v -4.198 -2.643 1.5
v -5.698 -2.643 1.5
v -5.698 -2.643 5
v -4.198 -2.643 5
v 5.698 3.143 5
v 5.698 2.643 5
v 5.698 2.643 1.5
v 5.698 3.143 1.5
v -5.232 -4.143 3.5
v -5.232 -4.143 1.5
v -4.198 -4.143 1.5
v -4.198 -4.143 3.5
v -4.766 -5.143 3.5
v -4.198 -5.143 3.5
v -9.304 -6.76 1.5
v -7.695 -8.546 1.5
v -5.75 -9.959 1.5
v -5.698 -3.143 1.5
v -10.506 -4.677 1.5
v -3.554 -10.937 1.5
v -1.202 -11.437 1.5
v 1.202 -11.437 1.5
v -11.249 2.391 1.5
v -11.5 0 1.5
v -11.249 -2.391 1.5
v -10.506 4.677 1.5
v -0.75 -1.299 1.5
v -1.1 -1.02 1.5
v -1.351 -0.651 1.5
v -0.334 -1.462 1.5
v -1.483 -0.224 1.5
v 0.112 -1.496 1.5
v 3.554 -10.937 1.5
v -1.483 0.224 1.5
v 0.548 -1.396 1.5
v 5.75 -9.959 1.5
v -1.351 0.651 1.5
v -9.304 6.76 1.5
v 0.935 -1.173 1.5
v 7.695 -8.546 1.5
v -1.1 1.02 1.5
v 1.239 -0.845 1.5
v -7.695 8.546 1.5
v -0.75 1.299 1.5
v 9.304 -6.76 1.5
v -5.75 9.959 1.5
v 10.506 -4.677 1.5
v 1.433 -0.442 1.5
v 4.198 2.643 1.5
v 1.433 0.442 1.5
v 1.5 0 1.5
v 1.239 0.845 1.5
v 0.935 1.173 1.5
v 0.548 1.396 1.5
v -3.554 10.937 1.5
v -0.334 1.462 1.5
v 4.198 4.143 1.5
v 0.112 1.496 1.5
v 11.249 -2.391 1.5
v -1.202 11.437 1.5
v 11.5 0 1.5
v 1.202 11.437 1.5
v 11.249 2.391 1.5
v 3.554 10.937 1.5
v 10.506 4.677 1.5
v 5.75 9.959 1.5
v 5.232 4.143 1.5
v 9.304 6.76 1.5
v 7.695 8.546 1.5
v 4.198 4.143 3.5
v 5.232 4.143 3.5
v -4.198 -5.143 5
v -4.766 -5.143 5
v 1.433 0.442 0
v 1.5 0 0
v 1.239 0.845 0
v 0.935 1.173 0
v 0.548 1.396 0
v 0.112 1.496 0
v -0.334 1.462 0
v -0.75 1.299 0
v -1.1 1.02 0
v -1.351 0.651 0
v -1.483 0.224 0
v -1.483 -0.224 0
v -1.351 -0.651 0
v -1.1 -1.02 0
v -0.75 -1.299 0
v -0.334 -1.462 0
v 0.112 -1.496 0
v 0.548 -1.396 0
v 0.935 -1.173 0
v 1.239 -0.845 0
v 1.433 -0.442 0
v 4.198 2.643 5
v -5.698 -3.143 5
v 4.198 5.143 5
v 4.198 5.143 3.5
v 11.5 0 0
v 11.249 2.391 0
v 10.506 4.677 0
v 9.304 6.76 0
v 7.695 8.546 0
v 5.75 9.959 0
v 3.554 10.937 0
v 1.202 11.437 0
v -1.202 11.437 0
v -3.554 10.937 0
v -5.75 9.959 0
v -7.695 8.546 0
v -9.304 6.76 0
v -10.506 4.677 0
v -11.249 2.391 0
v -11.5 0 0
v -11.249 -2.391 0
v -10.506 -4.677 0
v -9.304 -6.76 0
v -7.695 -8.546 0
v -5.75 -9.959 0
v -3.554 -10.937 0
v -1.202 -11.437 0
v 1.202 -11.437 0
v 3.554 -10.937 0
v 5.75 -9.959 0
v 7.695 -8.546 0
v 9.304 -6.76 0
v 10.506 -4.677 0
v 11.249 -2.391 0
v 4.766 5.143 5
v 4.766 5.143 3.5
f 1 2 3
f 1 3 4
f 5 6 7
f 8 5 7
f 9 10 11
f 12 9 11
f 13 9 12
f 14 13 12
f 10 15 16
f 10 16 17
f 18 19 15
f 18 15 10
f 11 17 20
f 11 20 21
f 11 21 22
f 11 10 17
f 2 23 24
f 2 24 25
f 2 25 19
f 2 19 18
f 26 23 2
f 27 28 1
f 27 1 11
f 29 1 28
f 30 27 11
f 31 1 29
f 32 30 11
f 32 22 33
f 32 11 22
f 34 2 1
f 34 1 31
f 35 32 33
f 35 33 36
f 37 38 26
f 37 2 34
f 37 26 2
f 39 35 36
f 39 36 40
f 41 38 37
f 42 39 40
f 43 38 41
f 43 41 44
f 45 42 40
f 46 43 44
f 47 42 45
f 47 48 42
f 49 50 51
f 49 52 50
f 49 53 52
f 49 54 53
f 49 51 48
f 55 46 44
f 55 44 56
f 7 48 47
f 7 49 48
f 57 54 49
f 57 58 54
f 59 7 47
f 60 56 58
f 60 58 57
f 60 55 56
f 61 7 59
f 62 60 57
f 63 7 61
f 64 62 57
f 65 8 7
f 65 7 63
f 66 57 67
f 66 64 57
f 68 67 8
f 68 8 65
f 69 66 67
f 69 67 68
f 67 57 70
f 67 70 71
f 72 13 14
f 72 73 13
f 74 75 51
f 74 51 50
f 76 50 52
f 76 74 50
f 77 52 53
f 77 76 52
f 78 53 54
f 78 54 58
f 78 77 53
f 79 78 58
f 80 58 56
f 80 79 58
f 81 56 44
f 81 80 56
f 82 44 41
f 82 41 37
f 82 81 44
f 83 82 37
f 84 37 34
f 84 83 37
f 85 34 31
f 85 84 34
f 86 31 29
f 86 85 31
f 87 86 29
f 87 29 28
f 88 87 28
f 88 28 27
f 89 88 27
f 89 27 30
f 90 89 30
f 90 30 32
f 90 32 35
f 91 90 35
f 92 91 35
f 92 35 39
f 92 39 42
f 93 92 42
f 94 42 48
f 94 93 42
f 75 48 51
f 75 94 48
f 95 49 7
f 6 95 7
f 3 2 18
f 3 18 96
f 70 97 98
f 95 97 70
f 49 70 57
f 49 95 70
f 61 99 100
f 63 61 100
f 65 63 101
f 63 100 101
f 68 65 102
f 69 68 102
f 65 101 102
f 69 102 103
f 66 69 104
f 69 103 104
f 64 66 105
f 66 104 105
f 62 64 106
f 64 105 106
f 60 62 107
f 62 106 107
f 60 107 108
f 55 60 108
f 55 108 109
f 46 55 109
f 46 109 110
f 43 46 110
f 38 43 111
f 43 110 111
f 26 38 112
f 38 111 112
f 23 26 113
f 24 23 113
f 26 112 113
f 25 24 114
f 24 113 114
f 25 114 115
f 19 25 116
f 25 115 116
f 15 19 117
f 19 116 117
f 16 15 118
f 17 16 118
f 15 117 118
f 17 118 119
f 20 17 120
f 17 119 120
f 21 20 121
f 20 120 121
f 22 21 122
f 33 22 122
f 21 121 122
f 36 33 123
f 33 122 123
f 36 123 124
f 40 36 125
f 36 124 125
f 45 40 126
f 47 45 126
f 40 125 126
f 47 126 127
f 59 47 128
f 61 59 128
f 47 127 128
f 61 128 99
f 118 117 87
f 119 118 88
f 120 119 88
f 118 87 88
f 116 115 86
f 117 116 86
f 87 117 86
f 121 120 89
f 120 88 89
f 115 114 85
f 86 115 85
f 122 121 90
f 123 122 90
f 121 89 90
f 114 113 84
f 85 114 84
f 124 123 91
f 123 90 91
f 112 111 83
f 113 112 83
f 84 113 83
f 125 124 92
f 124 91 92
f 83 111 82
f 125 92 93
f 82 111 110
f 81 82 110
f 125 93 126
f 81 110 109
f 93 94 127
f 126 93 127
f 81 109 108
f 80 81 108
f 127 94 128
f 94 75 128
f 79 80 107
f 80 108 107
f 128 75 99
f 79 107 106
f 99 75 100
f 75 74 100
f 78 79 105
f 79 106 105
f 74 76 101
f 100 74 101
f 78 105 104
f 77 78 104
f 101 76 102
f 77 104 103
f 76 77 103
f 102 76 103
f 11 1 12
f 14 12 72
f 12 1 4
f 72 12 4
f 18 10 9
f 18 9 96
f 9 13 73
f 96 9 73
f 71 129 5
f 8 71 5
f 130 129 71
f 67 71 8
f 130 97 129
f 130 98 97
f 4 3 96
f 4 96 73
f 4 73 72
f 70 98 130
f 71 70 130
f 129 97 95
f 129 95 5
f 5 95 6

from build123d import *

# Parameters (mm, degrees)
SKETCH1_R           = 11.5
SKETCH1_R_2         = 1.5
BOSS_EXTRUDE1_DEPTH = 1.5
SKETCH2_W           = 1.5
SKETCH2_H           = 1.5
BOSS_EXTRUDE3_DEPTH = 3.5
SKETCH3_W           = 1.5
SKETCH3_H           = 1.5
BOSS_EXTRUDE4_DEPTH = 1
CHAMFER2_SIZE       = 2
CHAMFER2_SIZE2      = 0.932615316
SKETCH5_W           = 1.5
SKETCH5_H           = 1.5
BOSS_EXTRUDE6_DEPTH = 1
CHAMFER5_SIZE       = 2
CHAMFER5_SIZE2      = 0.932615316


with BuildPart() as part:
    # Sketch1 → Boss-Extrude1 (new body)
    with BuildSketch(Plane.XY):
        Circle(SKETCH1_R)
        Circle(SKETCH1_R_2, mode=Mode.SUBTRACT)
    extrude(amount=BOSS_EXTRUDE1_DEPTH)

    # Sketch2 → Boss-Extrude3 (add)
    with BuildSketch(Plane.XY.offset(1.5)):
        with Locations((4.948341792, 3.393215807)):
            Rectangle(SKETCH2_W, SKETCH2_H)
        with Locations((-4.948341792, -3.393215807)):
            Rectangle(SKETCH2_W, SKETCH2_H)
    extrude(amount=BOSS_EXTRUDE3_DEPTH)

    # Sketch3 → Boss-Extrude4 (add)
    with BuildSketch(Plane(origin=(0, 4.143215807, 0), x_dir=(1, 0, 0), z_dir=(0, 1, 0))):
        with Locations((4.948341792, -4.25)):
            Rectangle(SKETCH3_W, SKETCH3_H)
    extrude(amount=BOSS_EXTRUDE4_DEPTH)

    # Chamfer2
    chamfer2_edges = [part.edges().sort_by_distance(p)[0] for p in [
        (5.698341792, 5.143215807, 4.25),
    ]]
    chamfer2_side = [part.faces().sort_by_distance(p)[0] for p in [
        (5.698341792, 3.670993585, 3.472222222),
    ]]
    chamfer(chamfer2_edges, length=CHAMFER2_SIZE, length2=CHAMFER2_SIZE2, reference=chamfer2_side[0])

    # Sketch5 → Boss-Extrude6 (add)
    with BuildSketch(Plane.XZ.offset(4.143215807)):
        with Locations((-4.948341792, 4.25)):
            Rectangle(SKETCH5_W, SKETCH5_H)
    extrude(amount=BOSS_EXTRUDE6_DEPTH)

    # Chamfer5
    chamfer5_edges = [part.edges().sort_by_distance(p)[0] for p in [
        (-5.698341792, -5.143215807, 4.25),
    ]]
    chamfer5_side = [part.faces().sort_by_distance(p)[0] for p in [
        (-5.698341792, -3.670993585, 3.472222222),
    ]]
    chamfer(chamfer5_edges, length=CHAMFER5_SIZE, length2=CHAMFER5_SIZE2, reference=chamfer5_side[0])


solid = part.part
